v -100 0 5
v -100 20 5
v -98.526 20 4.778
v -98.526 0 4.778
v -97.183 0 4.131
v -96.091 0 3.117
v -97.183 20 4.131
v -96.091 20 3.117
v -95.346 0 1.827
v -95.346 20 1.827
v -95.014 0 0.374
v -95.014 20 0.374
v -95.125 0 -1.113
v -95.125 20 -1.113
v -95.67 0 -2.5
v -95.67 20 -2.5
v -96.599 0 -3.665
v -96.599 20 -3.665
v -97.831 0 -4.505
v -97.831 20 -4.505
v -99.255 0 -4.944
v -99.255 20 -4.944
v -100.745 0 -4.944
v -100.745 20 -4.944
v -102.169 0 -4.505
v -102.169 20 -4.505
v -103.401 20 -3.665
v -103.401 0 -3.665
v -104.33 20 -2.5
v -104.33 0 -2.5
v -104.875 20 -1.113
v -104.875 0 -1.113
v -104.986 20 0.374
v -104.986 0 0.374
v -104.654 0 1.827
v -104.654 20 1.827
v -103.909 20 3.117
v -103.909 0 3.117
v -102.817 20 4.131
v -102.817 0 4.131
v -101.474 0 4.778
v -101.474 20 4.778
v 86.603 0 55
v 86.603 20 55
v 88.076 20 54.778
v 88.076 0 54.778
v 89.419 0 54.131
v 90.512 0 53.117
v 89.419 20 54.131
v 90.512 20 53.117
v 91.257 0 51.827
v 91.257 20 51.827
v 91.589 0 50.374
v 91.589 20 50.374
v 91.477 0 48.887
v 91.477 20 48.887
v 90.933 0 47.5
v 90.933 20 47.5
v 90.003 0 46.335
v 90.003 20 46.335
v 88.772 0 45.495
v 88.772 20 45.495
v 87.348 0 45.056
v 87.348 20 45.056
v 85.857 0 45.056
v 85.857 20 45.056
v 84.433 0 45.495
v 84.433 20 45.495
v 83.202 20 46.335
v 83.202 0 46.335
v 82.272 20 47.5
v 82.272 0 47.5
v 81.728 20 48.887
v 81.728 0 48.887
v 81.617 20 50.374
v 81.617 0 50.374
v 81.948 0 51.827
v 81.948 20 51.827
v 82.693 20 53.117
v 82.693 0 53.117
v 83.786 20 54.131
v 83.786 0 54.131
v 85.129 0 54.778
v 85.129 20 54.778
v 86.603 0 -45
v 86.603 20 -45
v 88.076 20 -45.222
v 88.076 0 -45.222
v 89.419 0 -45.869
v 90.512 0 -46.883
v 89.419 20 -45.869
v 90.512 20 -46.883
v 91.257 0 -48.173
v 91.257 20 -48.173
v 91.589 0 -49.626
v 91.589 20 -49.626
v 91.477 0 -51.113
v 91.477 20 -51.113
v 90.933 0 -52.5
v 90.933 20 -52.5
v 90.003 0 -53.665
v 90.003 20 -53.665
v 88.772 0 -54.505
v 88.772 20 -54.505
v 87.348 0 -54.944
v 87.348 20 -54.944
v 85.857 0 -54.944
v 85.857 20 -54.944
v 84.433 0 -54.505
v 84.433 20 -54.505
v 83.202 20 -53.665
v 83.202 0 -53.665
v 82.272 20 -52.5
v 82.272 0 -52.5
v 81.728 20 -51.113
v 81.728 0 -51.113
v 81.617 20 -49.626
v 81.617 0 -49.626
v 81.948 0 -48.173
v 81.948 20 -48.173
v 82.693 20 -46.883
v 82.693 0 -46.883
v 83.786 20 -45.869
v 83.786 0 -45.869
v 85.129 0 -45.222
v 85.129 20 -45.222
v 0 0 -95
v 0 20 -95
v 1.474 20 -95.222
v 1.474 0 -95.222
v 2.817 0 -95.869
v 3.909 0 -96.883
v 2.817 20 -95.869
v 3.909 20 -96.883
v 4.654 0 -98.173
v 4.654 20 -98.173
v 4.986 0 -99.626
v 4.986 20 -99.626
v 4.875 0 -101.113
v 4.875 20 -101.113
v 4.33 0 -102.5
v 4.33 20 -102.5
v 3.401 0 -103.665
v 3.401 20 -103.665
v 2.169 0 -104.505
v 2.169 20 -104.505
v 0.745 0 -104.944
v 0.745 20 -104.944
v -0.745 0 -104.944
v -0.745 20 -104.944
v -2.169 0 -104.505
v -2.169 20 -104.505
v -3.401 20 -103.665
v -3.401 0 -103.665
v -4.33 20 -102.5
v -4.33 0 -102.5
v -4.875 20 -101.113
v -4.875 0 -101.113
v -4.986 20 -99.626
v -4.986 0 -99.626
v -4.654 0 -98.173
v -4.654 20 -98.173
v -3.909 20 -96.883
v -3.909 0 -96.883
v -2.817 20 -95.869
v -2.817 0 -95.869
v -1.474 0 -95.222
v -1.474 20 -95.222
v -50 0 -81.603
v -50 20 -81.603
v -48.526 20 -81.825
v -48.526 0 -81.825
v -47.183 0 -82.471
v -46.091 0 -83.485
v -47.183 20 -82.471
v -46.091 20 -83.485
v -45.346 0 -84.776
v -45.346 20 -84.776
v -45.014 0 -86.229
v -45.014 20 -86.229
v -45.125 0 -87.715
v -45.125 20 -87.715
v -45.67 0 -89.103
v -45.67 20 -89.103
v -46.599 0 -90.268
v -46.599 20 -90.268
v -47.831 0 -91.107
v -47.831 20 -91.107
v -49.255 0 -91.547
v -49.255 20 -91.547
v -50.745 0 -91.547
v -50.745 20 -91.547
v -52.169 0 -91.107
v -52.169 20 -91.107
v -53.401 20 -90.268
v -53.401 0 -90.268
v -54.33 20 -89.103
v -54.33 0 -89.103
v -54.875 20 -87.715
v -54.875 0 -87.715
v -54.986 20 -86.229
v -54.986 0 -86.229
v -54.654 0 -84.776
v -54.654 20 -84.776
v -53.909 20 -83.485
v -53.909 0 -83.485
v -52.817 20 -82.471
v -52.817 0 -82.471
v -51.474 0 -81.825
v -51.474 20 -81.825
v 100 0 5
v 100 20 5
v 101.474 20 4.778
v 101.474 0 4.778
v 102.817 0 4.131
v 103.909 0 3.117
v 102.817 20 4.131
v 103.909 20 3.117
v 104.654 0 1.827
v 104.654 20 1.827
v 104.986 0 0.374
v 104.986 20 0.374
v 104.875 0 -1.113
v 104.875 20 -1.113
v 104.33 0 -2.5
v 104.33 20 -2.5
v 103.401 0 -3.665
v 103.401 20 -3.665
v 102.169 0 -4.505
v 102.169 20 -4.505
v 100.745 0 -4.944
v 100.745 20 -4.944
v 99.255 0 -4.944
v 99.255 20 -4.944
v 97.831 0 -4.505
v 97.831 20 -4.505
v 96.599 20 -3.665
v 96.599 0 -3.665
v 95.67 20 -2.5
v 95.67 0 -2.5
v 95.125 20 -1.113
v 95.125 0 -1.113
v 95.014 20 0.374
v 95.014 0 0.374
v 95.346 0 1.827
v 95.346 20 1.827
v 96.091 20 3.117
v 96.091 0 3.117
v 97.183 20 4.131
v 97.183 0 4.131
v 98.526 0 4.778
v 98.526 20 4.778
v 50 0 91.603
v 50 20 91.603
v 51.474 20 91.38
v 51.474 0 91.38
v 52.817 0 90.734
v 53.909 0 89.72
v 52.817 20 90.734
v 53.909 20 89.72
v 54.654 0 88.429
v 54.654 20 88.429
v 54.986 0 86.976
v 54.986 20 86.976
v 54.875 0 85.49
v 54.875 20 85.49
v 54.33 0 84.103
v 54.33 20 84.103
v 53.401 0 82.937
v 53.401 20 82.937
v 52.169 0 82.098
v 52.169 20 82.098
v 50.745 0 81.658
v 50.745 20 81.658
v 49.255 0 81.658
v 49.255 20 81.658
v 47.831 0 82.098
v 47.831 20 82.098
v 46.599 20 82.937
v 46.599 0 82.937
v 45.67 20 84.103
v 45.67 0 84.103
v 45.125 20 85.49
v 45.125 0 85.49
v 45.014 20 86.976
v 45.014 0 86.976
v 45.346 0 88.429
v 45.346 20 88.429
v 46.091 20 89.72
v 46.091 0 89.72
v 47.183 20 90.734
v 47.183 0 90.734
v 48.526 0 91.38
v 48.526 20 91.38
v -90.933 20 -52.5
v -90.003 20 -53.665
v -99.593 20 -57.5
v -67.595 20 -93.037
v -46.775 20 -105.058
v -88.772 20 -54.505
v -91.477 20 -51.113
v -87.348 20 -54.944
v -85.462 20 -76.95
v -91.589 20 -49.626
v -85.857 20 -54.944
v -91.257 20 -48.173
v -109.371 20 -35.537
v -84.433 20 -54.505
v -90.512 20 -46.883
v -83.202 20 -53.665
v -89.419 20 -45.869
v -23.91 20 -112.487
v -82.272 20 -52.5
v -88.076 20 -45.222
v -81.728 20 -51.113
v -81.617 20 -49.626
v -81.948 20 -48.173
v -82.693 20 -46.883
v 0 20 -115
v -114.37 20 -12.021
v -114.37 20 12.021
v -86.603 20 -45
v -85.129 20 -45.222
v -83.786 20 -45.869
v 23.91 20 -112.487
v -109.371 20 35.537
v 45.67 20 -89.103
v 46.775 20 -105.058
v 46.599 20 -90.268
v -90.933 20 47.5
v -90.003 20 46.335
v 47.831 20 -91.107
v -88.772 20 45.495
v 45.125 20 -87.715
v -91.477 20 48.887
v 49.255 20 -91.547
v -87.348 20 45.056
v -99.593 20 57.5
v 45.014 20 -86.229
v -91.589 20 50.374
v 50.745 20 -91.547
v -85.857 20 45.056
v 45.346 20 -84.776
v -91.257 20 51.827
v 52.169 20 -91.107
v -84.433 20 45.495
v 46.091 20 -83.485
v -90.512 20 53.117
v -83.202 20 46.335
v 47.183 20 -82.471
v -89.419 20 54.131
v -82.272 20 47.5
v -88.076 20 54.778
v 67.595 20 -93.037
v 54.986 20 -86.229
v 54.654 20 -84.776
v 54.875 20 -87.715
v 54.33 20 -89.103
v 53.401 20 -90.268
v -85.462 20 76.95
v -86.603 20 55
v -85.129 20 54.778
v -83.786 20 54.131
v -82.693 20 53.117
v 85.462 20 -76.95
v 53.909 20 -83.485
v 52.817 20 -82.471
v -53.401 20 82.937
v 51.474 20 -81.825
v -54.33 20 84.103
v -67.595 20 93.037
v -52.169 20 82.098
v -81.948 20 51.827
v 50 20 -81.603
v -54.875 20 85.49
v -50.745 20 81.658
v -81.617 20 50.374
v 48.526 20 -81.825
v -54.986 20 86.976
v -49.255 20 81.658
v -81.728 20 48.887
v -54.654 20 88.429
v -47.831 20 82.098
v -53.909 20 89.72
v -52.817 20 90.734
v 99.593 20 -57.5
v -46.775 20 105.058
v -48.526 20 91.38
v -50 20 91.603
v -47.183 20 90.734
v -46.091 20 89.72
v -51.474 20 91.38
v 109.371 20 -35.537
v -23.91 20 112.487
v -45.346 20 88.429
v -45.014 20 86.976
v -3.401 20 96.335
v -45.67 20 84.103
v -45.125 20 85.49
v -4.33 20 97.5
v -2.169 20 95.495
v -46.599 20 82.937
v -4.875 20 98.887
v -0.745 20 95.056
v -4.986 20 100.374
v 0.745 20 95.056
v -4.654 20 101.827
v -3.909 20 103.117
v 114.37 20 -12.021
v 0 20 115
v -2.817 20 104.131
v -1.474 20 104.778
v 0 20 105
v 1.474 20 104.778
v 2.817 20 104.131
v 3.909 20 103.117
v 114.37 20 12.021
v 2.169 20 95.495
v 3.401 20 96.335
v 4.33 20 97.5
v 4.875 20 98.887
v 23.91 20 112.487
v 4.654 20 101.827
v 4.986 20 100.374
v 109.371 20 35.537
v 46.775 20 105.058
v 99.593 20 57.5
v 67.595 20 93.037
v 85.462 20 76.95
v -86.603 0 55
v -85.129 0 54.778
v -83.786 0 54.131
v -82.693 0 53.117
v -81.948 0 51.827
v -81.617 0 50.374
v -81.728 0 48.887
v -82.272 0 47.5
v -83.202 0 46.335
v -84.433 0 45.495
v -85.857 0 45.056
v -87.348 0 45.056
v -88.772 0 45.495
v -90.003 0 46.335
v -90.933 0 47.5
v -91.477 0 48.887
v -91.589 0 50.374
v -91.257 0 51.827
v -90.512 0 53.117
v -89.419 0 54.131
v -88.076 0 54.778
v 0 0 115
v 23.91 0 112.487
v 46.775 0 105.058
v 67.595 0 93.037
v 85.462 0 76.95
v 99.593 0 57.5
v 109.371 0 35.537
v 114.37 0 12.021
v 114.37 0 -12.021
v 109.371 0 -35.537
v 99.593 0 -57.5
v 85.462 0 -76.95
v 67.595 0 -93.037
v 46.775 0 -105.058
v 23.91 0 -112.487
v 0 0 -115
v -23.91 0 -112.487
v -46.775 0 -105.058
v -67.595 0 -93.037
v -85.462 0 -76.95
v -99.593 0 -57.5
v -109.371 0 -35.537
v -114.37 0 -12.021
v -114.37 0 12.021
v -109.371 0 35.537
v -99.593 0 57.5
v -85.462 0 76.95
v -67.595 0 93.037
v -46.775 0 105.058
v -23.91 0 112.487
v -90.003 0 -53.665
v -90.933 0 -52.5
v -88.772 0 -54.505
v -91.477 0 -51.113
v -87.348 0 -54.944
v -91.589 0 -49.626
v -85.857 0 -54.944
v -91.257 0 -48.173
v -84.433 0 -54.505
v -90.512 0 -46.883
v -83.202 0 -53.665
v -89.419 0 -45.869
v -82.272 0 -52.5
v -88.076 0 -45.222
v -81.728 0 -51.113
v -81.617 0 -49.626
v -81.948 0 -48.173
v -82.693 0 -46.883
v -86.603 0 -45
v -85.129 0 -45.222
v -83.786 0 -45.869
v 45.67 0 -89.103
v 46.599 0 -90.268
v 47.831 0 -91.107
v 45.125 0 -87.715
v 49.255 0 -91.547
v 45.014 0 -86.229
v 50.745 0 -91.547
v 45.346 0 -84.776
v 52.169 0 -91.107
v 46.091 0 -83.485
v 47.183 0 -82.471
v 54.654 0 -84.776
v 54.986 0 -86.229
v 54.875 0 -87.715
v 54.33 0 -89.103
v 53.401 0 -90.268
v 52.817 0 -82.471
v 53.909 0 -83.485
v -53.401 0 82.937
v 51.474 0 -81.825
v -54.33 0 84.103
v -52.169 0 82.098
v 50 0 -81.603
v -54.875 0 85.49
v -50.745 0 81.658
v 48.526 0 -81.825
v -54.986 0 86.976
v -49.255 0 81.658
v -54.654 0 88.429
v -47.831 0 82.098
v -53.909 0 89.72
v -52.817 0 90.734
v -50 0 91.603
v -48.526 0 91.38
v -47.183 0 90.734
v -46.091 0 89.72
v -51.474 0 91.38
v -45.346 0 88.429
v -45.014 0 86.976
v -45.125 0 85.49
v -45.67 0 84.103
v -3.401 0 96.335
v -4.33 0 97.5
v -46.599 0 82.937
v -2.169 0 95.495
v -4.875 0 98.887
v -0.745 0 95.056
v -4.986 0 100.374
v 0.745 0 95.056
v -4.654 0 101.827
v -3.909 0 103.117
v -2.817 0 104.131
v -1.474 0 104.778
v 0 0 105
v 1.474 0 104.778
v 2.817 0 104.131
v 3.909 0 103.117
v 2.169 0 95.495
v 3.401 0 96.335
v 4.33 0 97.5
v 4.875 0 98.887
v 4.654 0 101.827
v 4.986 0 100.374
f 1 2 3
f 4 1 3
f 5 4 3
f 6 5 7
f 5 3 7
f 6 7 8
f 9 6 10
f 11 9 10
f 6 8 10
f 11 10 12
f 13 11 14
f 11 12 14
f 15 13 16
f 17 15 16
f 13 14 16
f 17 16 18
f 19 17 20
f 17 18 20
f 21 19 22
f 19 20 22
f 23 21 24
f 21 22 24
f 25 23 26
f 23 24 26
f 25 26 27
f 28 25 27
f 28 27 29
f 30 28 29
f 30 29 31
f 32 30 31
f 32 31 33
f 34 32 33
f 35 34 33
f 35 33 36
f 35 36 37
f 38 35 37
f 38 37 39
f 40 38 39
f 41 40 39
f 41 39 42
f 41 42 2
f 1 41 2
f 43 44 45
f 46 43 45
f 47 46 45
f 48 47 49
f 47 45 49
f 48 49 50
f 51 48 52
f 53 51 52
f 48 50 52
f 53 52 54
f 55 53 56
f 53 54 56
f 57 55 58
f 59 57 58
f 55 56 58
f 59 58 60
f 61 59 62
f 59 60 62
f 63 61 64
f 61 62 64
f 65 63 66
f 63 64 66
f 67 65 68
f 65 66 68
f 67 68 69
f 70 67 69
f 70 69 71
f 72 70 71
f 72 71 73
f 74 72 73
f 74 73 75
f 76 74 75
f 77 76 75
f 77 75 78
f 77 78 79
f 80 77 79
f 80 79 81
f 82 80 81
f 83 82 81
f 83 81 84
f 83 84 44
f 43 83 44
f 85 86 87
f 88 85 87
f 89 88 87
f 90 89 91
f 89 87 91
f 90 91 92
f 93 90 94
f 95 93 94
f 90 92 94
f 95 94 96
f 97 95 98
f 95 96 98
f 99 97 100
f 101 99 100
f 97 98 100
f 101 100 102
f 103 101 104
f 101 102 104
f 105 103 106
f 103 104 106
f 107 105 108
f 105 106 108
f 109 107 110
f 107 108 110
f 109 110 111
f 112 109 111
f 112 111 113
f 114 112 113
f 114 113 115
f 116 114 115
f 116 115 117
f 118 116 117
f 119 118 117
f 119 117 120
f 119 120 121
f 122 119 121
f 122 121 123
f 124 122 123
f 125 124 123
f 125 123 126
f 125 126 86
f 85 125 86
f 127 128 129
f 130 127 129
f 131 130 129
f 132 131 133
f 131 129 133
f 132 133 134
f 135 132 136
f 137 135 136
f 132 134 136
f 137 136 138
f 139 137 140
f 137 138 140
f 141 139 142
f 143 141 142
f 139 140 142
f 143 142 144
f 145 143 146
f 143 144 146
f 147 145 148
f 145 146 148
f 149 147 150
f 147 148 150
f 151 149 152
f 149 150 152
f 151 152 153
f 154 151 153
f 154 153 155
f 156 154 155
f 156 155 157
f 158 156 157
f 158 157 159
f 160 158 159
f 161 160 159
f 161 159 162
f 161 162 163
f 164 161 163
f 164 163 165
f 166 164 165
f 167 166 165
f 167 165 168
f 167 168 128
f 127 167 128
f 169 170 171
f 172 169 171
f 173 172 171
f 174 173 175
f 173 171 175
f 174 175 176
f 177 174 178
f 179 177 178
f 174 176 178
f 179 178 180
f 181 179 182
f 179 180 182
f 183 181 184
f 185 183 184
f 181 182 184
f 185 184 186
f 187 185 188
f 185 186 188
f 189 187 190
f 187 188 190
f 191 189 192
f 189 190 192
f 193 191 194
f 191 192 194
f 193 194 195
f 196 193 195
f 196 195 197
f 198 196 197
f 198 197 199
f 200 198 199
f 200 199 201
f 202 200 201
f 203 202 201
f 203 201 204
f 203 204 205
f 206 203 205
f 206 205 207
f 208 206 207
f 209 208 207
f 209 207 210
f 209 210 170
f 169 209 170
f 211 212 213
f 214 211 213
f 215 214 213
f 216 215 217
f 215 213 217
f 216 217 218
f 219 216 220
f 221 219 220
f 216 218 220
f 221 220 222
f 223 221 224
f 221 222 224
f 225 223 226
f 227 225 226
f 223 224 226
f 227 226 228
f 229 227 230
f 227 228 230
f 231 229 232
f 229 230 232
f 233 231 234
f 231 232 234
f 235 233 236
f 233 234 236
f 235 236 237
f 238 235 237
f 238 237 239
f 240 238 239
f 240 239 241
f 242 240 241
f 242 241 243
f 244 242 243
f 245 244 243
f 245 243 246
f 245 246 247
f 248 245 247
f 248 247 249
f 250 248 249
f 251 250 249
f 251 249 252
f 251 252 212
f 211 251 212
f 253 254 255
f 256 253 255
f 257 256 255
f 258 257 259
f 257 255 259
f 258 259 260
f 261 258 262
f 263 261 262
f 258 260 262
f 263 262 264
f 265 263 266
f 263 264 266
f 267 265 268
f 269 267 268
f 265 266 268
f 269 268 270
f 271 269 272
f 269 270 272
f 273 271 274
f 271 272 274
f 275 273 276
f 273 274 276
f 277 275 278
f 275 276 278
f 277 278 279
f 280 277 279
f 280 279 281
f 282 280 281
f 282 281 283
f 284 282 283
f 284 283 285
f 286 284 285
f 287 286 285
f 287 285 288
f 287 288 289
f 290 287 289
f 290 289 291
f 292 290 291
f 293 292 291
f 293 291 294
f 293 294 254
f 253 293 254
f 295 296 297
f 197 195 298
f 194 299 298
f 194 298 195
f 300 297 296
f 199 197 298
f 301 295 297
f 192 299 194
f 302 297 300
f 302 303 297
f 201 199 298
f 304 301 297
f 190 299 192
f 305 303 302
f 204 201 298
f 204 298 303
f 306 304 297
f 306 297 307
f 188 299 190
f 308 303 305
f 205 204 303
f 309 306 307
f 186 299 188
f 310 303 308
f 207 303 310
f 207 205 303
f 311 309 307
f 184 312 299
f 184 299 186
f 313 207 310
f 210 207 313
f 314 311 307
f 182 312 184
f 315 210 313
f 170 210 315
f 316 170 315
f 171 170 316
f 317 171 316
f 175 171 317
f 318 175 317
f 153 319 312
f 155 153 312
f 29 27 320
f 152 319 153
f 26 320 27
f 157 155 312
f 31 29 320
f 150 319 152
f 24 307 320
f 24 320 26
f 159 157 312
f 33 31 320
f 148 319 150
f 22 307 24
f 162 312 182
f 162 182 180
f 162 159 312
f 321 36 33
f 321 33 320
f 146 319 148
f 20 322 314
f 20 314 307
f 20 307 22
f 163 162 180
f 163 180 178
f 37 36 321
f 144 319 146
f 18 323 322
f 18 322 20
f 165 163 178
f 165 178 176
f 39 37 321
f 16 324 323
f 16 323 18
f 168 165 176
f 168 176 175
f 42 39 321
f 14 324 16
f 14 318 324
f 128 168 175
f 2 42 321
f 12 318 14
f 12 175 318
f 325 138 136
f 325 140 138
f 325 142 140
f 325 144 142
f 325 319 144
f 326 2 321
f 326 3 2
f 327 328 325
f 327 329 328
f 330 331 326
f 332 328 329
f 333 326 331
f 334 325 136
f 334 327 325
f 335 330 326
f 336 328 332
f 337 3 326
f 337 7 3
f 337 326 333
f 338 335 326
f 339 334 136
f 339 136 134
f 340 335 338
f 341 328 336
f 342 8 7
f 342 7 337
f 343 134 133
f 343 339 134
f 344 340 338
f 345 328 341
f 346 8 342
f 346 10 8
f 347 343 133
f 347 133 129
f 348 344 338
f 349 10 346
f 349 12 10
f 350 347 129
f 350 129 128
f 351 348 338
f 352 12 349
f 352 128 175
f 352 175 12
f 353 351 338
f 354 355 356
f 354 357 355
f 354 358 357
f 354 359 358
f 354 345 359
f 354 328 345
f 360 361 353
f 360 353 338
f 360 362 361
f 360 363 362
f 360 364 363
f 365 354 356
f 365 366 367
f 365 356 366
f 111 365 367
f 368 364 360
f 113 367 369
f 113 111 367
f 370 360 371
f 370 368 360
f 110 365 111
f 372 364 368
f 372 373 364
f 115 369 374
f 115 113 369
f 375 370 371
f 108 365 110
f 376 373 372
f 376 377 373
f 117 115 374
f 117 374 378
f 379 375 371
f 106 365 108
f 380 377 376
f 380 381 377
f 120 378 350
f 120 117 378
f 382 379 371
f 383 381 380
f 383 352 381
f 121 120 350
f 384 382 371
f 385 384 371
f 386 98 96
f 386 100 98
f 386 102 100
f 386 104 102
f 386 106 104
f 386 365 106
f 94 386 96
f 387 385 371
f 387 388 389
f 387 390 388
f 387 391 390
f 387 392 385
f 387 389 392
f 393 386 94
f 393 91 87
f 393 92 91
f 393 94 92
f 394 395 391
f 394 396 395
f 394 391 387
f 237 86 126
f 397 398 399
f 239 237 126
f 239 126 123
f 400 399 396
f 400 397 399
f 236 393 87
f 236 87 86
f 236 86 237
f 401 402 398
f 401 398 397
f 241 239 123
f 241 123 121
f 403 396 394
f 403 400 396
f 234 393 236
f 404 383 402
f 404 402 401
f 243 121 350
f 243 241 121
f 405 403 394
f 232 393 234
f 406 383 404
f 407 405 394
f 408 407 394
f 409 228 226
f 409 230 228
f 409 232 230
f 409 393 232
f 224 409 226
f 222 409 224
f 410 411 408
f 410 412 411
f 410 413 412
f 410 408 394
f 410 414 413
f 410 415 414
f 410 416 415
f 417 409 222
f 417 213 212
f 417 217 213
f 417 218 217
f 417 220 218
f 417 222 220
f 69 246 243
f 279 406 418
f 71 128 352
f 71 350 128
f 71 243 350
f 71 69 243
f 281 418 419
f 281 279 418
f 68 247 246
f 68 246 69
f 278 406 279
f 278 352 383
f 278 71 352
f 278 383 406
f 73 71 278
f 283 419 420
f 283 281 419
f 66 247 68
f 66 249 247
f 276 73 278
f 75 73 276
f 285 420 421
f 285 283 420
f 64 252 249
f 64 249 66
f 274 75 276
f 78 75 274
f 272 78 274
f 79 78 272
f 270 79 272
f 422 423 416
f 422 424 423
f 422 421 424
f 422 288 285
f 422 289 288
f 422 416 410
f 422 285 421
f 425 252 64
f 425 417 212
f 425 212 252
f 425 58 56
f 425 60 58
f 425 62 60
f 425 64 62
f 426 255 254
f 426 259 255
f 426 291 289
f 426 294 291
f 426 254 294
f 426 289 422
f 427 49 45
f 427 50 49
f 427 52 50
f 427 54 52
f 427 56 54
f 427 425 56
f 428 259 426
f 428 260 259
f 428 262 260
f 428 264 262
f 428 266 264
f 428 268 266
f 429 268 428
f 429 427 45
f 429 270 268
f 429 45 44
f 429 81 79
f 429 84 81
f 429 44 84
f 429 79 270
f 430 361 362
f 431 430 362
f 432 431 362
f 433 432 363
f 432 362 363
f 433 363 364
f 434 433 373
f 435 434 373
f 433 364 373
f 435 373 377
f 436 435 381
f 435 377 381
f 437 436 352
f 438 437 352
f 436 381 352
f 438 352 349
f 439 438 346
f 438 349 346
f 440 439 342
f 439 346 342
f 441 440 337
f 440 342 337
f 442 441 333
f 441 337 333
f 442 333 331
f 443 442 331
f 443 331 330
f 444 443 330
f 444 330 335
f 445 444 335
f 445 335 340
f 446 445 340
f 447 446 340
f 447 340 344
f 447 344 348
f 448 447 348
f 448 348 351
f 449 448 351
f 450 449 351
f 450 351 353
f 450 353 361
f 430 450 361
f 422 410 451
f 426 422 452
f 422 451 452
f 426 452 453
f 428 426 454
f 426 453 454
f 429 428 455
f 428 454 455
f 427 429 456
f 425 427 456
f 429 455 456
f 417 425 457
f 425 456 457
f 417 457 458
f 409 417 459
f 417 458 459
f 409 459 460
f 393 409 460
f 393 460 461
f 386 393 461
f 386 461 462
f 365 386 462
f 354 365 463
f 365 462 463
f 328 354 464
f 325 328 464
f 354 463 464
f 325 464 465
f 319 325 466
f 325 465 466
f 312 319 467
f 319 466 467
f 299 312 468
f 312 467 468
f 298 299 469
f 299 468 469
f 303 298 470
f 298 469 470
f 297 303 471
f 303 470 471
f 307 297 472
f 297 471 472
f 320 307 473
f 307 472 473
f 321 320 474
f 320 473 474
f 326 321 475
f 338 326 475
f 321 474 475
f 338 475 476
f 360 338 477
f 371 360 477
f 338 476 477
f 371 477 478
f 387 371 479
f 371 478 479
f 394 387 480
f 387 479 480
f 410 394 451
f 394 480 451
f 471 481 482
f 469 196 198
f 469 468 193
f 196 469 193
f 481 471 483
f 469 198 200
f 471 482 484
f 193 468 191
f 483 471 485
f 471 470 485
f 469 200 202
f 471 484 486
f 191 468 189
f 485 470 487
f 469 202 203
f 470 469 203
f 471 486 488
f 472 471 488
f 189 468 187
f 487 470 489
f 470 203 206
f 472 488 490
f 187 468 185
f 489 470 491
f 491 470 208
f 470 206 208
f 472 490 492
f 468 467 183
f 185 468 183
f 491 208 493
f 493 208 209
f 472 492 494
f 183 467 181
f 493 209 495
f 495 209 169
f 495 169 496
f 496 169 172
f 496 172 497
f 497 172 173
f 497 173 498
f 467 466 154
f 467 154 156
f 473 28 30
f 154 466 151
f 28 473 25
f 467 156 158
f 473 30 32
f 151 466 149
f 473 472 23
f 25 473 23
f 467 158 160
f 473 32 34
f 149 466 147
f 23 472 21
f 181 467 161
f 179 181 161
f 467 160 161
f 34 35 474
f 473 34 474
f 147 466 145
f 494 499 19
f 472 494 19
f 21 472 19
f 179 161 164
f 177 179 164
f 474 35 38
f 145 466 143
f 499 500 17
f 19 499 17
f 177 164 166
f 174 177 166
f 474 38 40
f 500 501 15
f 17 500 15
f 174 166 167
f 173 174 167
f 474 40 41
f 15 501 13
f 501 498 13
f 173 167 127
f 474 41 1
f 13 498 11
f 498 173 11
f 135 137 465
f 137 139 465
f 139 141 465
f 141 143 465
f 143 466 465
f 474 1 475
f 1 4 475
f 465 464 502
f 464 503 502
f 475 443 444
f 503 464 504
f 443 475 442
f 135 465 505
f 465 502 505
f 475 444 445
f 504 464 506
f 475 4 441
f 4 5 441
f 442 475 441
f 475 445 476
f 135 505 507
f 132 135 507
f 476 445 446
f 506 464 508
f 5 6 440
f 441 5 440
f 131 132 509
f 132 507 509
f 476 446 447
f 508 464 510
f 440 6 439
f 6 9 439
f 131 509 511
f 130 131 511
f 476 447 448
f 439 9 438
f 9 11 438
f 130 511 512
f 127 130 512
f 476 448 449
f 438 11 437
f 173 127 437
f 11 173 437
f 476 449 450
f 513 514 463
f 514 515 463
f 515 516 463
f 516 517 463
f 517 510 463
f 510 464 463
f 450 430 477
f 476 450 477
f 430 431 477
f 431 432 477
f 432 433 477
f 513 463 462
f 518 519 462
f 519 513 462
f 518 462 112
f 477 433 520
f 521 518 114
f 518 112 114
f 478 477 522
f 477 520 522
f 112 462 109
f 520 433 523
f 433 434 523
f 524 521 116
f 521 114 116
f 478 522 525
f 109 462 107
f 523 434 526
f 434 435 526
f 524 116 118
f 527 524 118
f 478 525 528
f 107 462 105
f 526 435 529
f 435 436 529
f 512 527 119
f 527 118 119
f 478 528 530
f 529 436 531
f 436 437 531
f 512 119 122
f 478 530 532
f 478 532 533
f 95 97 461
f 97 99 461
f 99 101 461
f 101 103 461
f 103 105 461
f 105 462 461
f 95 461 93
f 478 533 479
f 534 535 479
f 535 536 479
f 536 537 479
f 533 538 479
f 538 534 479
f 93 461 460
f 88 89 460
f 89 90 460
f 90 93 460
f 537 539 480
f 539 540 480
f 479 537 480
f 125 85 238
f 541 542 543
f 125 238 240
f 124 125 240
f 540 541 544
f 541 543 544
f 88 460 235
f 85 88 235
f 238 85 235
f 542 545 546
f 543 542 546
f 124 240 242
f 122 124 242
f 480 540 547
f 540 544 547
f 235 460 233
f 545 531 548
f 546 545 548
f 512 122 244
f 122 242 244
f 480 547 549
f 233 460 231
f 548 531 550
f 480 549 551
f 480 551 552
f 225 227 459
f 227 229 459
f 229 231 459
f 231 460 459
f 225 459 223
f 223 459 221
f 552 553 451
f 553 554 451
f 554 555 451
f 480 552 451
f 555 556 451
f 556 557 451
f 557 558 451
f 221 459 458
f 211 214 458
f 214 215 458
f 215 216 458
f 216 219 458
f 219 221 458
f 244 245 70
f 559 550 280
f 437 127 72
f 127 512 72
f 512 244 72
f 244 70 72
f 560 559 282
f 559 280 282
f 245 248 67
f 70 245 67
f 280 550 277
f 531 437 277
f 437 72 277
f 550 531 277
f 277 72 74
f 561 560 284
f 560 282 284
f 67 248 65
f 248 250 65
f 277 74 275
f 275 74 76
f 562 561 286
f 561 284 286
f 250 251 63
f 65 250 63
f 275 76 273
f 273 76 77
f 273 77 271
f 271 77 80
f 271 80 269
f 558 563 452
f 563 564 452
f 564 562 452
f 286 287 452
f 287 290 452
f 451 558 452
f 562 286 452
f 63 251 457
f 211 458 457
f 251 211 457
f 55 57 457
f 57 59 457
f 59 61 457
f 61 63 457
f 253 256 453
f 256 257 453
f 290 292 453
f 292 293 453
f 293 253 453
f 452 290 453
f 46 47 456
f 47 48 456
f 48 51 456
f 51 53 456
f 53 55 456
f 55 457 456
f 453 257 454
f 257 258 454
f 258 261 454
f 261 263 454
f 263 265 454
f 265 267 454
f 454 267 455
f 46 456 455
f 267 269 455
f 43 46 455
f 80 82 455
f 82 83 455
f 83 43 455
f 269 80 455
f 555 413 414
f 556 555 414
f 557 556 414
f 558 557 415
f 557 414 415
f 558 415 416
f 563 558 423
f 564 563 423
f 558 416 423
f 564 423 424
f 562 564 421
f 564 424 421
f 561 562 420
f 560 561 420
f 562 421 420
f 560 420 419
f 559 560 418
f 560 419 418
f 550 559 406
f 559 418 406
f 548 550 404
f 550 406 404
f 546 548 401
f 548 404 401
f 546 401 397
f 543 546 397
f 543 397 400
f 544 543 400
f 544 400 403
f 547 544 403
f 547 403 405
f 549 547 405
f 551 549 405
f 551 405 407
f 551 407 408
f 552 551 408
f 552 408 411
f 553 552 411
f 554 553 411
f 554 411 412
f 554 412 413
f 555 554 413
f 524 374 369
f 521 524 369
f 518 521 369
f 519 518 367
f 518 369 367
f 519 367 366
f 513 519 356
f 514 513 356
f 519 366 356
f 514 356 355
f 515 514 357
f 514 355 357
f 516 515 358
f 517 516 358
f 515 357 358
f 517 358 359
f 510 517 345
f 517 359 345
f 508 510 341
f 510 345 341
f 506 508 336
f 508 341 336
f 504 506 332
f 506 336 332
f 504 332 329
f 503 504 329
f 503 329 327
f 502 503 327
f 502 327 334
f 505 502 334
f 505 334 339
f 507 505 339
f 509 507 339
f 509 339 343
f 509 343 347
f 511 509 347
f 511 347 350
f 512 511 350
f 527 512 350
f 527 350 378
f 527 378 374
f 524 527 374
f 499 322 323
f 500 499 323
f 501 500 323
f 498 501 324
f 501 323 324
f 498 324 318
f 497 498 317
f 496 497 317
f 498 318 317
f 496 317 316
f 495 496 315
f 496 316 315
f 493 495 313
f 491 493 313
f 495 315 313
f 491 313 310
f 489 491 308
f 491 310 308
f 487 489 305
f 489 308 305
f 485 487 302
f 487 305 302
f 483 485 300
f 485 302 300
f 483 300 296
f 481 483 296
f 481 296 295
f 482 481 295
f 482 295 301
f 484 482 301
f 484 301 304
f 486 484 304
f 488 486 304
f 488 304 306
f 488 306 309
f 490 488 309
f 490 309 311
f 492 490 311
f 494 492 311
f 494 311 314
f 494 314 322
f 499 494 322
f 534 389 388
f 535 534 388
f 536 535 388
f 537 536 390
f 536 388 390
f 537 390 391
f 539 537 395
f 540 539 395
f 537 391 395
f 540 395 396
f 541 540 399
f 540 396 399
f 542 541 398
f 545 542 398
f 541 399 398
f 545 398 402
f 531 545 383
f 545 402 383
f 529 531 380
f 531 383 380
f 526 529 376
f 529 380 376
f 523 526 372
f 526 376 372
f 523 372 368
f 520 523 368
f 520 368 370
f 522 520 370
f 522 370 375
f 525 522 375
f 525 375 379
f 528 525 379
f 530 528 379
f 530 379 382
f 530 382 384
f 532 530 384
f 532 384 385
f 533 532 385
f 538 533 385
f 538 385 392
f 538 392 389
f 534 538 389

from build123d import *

# Parameters (mm, degrees)
SKETCH1_R           = 115
BOSS_EXTRUDE1_DEPTH = 20
CUT_EXTRUDE1_REACH  = 165.86
SKETCH2_R           = 5


with BuildPart() as part:
    # Sketch1 → Boss-Extrude1 (new body)
    with BuildSketch(Plane(origin=(0, 0, 0), x_dir=(1, 0, 0), z_dir=(0, 1, 0))):
        with Locations(Location((0, 0, 0), (0, 0, 270))):
            Circle(SKETCH1_R)
    extrude(amount=BOSS_EXTRUDE1_DEPTH)

    # Sketch2 → Cut-Extrude1 (cut, up to next)
    with BuildSketch(Plane(origin=(0, 20, 0), x_dir=(1, 0, 0), z_dir=(0, 1, 0)), mode=Mode.PRIVATE) as cut_extrude1_sk1:
        with Locations(Location((0, 100, 0), (0, 0, 270))):
            Circle(SKETCH2_R)
    cut_extrude1_tool1 = extrude(cut_extrude1_sk1.sketch, amount=-CUT_EXTRUDE1_REACH, mode=Mode.PRIVATE) & part.part
    # Sketch2 → Cut-Extrude1 (cut, up to next)
    with BuildSketch(Plane(origin=(0, 20, 0), x_dir=(1, 0, 0), z_dir=(0, 1, 0)), mode=Mode.PRIVATE) as cut_extrude1_sk2:
        with Locations(Location((50, 86.602540378, 0), (0, 0, 270))):
            Circle(SKETCH2_R)
    cut_extrude1_tool2 = extrude(cut_extrude1_sk2.sketch, amount=-CUT_EXTRUDE1_REACH, mode=Mode.PRIVATE) & part.part
    # Sketch2 → Cut-Extrude1 (cut, up to next)
    with BuildSketch(Plane(origin=(0, 20, 0), x_dir=(1, 0, 0), z_dir=(0, 1, 0)), mode=Mode.PRIVATE) as cut_extrude1_sk3:
        with Locations(Location((86.602540378, 50, 0), (0, 0, 270))):
            Circle(SKETCH2_R)
    cut_extrude1_tool3 = extrude(cut_extrude1_sk3.sketch, amount=-CUT_EXTRUDE1_REACH, mode=Mode.PRIVATE) & part.part
    # Sketch2 → Cut-Extrude1 (cut, up to next)
    with BuildSketch(Plane(origin=(0, 20, 0), x_dir=(1, 0, 0), z_dir=(0, 1, 0)), mode=Mode.PRIVATE) as cut_extrude1_sk4:
        with Locations(Location((100, 0, 0), (0, 0, 270))):
            Circle(SKETCH2_R)
    cut_extrude1_tool4 = extrude(cut_extrude1_sk4.sketch, amount=-CUT_EXTRUDE1_REACH, mode=Mode.PRIVATE) & part.part
    # Sketch2 → Cut-Extrude1 (cut, up to next)
    with BuildSketch(Plane(origin=(0, 20, 0), x_dir=(1, 0, 0), z_dir=(0, 1, 0)), mode=Mode.PRIVATE) as cut_extrude1_sk5:
        with Locations(Location((86.602540378, -50, 0), (0, 0, 270))):
            Circle(SKETCH2_R)
    cut_extrude1_tool5 = extrude(cut_extrude1_sk5.sketch, amount=-CUT_EXTRUDE1_REACH, mode=Mode.PRIVATE) & part.part
    # Sketch2 → Cut-Extrude1 (cut, up to next)
    with BuildSketch(Plane(origin=(0, 20, 0), x_dir=(1, 0, 0), z_dir=(0, 1, 0)), mode=Mode.PRIVATE) as cut_extrude1_sk6:
        with Locations(Location((50, -86.602540378, 0), (0, 0, 270))):
            Circle(SKETCH2_R)
    cut_extrude1_tool6 = extrude(cut_extrude1_sk6.sketch, amount=-CUT_EXTRUDE1_REACH, mode=Mode.PRIVATE) & part.part
    # Sketch2 → Cut-Extrude1 (cut, up to next)
    with BuildSketch(Plane(origin=(0, 20, 0), x_dir=(1, 0, 0), z_dir=(0, 1, 0)), mode=Mode.PRIVATE) as cut_extrude1_sk7:
        with Locations(Location((0, -100, 0), (0, 0, 270))):
            Circle(SKETCH2_R)
    cut_extrude1_tool7 = extrude(cut_extrude1_sk7.sketch, amount=-CUT_EXTRUDE1_REACH, mode=Mode.PRIVATE) & part.part
    # Sketch2 → Cut-Extrude1 (cut, up to next)
    with BuildSketch(Plane(origin=(0, 20, 0), x_dir=(1, 0, 0), z_dir=(0, 1, 0)), mode=Mode.PRIVATE) as cut_extrude1_sk8:
        with Locations(Location((-50, -86.602540378, 0), (0, 0, 270))):
            Circle(SKETCH2_R)
    cut_extrude1_tool8 = extrude(cut_extrude1_sk8.sketch, amount=-CUT_EXTRUDE1_REACH, mode=Mode.PRIVATE) & part.part
    # Sketch2 → Cut-Extrude1 (cut, up to next)
    with BuildSketch(Plane(origin=(0, 20, 0), x_dir=(1, 0, 0), z_dir=(0, 1, 0)), mode=Mode.PRIVATE) as cut_extrude1_sk9:
        with Locations(Location((-86.602540378, -50, 0), (0, 0, 270))):
            Circle(SKETCH2_R)
    cut_extrude1_tool9 = extrude(cut_extrude1_sk9.sketch, amount=-CUT_EXTRUDE1_REACH, mode=Mode.PRIVATE) & part.part
    # Sketch2 → Cut-Extrude1 (cut, up to next)
    with BuildSketch(Plane(origin=(0, 20, 0), x_dir=(1, 0, 0), z_dir=(0, 1, 0)), mode=Mode.PRIVATE) as cut_extrude1_sk10:
        with Locations(Location((-100, 0, 0), (0, 0, 270))):
            Circle(SKETCH2_R)
    cut_extrude1_tool10 = extrude(cut_extrude1_sk10.sketch, amount=-CUT_EXTRUDE1_REACH, mode=Mode.PRIVATE) & part.part
    # Sketch2 → Cut-Extrude1 (cut, up to next)
    with BuildSketch(Plane(origin=(0, 20, 0), x_dir=(1, 0, 0), z_dir=(0, 1, 0)), mode=Mode.PRIVATE) as cut_extrude1_sk11:
        with Locations(Location((-86.602540378, 50, 0), (0, 0, 270))):
            Circle(SKETCH2_R)
    cut_extrude1_tool11 = extrude(cut_extrude1_sk11.sketch, amount=-CUT_EXTRUDE1_REACH, mode=Mode.PRIVATE) & part.part
    # Sketch2 → Cut-Extrude1 (cut, up to next)
    with BuildSketch(Plane(origin=(0, 20, 0), x_dir=(1, 0, 0), z_dir=(0, 1, 0)), mode=Mode.PRIVATE) as cut_extrude1_sk12:
        with Locations(Location((-50, 86.602540378, 0), (0, 0, 270))):
            Circle(SKETCH2_R)
    cut_extrude1_tool12 = extrude(cut_extrude1_sk12.sketch, amount=-CUT_EXTRUDE1_REACH, mode=Mode.PRIVATE) & part.part
    add(cut_extrude1_tool1.solids().sort_by_distance((0, 20, -100))[0], mode=Mode.SUBTRACT)
    add(cut_extrude1_tool2.solids().sort_by_distance((50, 20, -86.60254))[0], mode=Mode.SUBTRACT)
    add(cut_extrude1_tool3.solids().sort_by_distance((86.60254, 20, -50))[0], mode=Mode.SUBTRACT)
    add(cut_extrude1_tool4.solids().sort_by_distance((100, 20, 0))[0], mode=Mode.SUBTRACT)
    add(cut_extrude1_tool5.solids().sort_by_distance((86.60254, 20, 50))[0], mode=Mode.SUBTRACT)
    add(cut_extrude1_tool6.solids().sort_by_distance((50, 20, 86.60254))[0], mode=Mode.SUBTRACT)
    add(cut_extrude1_tool7.solids().sort_by_distance((0, 20, 100))[0], mode=Mode.SUBTRACT)
    add(cut_extrude1_tool8.solids().sort_by_distance((-50, 20, 86.60254))[0], mode=Mode.SUBTRACT)
    add(cut_extrude1_tool9.solids().sort_by_distance((-86.60254, 20, 50))[0], mode=Mode.SUBTRACT)
    add(cut_extrude1_tool10.solids().sort_by_distance((-100, 20, 0))[0], mode=Mode.SUBTRACT)
    add(cut_extrude1_tool11.solids().sort_by_distance((-86.60254, 20, -50))[0], mode=Mode.SUBTRACT)
    add(cut_extrude1_tool12.solids().sort_by_distance((-50, 20, -86.60254))[0], mode=Mode.SUBTRACT)


solid = part.part
